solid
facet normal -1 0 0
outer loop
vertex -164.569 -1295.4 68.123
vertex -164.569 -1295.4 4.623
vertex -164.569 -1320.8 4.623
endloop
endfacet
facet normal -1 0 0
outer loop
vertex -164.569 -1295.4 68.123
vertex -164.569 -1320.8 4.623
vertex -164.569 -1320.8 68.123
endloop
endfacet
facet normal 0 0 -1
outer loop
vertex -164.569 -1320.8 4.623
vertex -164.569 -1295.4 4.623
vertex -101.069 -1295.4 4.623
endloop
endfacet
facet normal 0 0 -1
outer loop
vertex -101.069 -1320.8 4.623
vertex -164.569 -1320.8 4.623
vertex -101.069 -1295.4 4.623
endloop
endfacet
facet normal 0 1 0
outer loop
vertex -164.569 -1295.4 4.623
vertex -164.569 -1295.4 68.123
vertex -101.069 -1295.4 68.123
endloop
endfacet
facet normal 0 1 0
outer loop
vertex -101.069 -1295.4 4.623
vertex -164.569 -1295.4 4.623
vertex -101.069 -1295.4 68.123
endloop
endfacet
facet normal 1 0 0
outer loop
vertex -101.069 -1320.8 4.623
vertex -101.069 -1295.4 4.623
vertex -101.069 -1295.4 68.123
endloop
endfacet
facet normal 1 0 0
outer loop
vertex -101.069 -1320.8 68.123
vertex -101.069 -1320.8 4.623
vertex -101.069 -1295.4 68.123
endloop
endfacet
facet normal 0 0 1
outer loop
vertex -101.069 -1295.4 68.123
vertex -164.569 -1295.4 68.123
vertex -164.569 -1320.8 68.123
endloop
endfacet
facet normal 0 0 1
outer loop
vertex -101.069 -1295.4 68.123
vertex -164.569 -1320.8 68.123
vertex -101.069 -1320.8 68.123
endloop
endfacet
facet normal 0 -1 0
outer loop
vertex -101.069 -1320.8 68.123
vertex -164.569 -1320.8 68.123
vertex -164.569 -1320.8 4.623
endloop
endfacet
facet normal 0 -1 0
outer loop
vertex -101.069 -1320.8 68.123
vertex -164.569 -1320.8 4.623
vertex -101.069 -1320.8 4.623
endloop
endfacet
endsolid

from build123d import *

# Parameters (mm, degrees)
F0_W     = 63.5
F0_H     = 63.5
F1_DEPTH = 1498.6
F2_DEPTH = 1092.2
F3_DEPTH = 203.2
F4_DEPTH = 177.8


with BuildPart() as f1:
    # F0 (on Front) → F1 (new body)
    with BuildSketch(Plane.XZ):
        with Locations((-132.8186606169, 36.3734573238)):
            Rectangle(F0_W, F0_H)
    extrude(amount=F1_DEPTH)

    # F2 (cut): a face of the model
    f2_faces = [f1.faces().sort_by_distance(p)[0] for p in [
        (-132.8186606169, 0, 36.3734573238),
    ]]
    extrude(f2_faces, amount=-F2_DEPTH, mode=Mode.SUBTRACT)

    # F3 (cut): a face of the model
    f3_faces = [f1.faces().sort_by_distance(p)[0] for p in [
        (-132.8186606169, -1092.2, 36.3734573238),
    ]]
    extrude(f3_faces, amount=-F3_DEPTH, mode=Mode.SUBTRACT)

    # F4 (cut): a face of the model
    f4_faces = [f1.faces().sort_by_distance(p)[0] for p in [
        (-132.8186606169, -1498.6, 36.3734573238),
    ]]
    extrude(f4_faces, amount=-F4_DEPTH, mode=Mode.SUBTRACT)


solid = f1.part
